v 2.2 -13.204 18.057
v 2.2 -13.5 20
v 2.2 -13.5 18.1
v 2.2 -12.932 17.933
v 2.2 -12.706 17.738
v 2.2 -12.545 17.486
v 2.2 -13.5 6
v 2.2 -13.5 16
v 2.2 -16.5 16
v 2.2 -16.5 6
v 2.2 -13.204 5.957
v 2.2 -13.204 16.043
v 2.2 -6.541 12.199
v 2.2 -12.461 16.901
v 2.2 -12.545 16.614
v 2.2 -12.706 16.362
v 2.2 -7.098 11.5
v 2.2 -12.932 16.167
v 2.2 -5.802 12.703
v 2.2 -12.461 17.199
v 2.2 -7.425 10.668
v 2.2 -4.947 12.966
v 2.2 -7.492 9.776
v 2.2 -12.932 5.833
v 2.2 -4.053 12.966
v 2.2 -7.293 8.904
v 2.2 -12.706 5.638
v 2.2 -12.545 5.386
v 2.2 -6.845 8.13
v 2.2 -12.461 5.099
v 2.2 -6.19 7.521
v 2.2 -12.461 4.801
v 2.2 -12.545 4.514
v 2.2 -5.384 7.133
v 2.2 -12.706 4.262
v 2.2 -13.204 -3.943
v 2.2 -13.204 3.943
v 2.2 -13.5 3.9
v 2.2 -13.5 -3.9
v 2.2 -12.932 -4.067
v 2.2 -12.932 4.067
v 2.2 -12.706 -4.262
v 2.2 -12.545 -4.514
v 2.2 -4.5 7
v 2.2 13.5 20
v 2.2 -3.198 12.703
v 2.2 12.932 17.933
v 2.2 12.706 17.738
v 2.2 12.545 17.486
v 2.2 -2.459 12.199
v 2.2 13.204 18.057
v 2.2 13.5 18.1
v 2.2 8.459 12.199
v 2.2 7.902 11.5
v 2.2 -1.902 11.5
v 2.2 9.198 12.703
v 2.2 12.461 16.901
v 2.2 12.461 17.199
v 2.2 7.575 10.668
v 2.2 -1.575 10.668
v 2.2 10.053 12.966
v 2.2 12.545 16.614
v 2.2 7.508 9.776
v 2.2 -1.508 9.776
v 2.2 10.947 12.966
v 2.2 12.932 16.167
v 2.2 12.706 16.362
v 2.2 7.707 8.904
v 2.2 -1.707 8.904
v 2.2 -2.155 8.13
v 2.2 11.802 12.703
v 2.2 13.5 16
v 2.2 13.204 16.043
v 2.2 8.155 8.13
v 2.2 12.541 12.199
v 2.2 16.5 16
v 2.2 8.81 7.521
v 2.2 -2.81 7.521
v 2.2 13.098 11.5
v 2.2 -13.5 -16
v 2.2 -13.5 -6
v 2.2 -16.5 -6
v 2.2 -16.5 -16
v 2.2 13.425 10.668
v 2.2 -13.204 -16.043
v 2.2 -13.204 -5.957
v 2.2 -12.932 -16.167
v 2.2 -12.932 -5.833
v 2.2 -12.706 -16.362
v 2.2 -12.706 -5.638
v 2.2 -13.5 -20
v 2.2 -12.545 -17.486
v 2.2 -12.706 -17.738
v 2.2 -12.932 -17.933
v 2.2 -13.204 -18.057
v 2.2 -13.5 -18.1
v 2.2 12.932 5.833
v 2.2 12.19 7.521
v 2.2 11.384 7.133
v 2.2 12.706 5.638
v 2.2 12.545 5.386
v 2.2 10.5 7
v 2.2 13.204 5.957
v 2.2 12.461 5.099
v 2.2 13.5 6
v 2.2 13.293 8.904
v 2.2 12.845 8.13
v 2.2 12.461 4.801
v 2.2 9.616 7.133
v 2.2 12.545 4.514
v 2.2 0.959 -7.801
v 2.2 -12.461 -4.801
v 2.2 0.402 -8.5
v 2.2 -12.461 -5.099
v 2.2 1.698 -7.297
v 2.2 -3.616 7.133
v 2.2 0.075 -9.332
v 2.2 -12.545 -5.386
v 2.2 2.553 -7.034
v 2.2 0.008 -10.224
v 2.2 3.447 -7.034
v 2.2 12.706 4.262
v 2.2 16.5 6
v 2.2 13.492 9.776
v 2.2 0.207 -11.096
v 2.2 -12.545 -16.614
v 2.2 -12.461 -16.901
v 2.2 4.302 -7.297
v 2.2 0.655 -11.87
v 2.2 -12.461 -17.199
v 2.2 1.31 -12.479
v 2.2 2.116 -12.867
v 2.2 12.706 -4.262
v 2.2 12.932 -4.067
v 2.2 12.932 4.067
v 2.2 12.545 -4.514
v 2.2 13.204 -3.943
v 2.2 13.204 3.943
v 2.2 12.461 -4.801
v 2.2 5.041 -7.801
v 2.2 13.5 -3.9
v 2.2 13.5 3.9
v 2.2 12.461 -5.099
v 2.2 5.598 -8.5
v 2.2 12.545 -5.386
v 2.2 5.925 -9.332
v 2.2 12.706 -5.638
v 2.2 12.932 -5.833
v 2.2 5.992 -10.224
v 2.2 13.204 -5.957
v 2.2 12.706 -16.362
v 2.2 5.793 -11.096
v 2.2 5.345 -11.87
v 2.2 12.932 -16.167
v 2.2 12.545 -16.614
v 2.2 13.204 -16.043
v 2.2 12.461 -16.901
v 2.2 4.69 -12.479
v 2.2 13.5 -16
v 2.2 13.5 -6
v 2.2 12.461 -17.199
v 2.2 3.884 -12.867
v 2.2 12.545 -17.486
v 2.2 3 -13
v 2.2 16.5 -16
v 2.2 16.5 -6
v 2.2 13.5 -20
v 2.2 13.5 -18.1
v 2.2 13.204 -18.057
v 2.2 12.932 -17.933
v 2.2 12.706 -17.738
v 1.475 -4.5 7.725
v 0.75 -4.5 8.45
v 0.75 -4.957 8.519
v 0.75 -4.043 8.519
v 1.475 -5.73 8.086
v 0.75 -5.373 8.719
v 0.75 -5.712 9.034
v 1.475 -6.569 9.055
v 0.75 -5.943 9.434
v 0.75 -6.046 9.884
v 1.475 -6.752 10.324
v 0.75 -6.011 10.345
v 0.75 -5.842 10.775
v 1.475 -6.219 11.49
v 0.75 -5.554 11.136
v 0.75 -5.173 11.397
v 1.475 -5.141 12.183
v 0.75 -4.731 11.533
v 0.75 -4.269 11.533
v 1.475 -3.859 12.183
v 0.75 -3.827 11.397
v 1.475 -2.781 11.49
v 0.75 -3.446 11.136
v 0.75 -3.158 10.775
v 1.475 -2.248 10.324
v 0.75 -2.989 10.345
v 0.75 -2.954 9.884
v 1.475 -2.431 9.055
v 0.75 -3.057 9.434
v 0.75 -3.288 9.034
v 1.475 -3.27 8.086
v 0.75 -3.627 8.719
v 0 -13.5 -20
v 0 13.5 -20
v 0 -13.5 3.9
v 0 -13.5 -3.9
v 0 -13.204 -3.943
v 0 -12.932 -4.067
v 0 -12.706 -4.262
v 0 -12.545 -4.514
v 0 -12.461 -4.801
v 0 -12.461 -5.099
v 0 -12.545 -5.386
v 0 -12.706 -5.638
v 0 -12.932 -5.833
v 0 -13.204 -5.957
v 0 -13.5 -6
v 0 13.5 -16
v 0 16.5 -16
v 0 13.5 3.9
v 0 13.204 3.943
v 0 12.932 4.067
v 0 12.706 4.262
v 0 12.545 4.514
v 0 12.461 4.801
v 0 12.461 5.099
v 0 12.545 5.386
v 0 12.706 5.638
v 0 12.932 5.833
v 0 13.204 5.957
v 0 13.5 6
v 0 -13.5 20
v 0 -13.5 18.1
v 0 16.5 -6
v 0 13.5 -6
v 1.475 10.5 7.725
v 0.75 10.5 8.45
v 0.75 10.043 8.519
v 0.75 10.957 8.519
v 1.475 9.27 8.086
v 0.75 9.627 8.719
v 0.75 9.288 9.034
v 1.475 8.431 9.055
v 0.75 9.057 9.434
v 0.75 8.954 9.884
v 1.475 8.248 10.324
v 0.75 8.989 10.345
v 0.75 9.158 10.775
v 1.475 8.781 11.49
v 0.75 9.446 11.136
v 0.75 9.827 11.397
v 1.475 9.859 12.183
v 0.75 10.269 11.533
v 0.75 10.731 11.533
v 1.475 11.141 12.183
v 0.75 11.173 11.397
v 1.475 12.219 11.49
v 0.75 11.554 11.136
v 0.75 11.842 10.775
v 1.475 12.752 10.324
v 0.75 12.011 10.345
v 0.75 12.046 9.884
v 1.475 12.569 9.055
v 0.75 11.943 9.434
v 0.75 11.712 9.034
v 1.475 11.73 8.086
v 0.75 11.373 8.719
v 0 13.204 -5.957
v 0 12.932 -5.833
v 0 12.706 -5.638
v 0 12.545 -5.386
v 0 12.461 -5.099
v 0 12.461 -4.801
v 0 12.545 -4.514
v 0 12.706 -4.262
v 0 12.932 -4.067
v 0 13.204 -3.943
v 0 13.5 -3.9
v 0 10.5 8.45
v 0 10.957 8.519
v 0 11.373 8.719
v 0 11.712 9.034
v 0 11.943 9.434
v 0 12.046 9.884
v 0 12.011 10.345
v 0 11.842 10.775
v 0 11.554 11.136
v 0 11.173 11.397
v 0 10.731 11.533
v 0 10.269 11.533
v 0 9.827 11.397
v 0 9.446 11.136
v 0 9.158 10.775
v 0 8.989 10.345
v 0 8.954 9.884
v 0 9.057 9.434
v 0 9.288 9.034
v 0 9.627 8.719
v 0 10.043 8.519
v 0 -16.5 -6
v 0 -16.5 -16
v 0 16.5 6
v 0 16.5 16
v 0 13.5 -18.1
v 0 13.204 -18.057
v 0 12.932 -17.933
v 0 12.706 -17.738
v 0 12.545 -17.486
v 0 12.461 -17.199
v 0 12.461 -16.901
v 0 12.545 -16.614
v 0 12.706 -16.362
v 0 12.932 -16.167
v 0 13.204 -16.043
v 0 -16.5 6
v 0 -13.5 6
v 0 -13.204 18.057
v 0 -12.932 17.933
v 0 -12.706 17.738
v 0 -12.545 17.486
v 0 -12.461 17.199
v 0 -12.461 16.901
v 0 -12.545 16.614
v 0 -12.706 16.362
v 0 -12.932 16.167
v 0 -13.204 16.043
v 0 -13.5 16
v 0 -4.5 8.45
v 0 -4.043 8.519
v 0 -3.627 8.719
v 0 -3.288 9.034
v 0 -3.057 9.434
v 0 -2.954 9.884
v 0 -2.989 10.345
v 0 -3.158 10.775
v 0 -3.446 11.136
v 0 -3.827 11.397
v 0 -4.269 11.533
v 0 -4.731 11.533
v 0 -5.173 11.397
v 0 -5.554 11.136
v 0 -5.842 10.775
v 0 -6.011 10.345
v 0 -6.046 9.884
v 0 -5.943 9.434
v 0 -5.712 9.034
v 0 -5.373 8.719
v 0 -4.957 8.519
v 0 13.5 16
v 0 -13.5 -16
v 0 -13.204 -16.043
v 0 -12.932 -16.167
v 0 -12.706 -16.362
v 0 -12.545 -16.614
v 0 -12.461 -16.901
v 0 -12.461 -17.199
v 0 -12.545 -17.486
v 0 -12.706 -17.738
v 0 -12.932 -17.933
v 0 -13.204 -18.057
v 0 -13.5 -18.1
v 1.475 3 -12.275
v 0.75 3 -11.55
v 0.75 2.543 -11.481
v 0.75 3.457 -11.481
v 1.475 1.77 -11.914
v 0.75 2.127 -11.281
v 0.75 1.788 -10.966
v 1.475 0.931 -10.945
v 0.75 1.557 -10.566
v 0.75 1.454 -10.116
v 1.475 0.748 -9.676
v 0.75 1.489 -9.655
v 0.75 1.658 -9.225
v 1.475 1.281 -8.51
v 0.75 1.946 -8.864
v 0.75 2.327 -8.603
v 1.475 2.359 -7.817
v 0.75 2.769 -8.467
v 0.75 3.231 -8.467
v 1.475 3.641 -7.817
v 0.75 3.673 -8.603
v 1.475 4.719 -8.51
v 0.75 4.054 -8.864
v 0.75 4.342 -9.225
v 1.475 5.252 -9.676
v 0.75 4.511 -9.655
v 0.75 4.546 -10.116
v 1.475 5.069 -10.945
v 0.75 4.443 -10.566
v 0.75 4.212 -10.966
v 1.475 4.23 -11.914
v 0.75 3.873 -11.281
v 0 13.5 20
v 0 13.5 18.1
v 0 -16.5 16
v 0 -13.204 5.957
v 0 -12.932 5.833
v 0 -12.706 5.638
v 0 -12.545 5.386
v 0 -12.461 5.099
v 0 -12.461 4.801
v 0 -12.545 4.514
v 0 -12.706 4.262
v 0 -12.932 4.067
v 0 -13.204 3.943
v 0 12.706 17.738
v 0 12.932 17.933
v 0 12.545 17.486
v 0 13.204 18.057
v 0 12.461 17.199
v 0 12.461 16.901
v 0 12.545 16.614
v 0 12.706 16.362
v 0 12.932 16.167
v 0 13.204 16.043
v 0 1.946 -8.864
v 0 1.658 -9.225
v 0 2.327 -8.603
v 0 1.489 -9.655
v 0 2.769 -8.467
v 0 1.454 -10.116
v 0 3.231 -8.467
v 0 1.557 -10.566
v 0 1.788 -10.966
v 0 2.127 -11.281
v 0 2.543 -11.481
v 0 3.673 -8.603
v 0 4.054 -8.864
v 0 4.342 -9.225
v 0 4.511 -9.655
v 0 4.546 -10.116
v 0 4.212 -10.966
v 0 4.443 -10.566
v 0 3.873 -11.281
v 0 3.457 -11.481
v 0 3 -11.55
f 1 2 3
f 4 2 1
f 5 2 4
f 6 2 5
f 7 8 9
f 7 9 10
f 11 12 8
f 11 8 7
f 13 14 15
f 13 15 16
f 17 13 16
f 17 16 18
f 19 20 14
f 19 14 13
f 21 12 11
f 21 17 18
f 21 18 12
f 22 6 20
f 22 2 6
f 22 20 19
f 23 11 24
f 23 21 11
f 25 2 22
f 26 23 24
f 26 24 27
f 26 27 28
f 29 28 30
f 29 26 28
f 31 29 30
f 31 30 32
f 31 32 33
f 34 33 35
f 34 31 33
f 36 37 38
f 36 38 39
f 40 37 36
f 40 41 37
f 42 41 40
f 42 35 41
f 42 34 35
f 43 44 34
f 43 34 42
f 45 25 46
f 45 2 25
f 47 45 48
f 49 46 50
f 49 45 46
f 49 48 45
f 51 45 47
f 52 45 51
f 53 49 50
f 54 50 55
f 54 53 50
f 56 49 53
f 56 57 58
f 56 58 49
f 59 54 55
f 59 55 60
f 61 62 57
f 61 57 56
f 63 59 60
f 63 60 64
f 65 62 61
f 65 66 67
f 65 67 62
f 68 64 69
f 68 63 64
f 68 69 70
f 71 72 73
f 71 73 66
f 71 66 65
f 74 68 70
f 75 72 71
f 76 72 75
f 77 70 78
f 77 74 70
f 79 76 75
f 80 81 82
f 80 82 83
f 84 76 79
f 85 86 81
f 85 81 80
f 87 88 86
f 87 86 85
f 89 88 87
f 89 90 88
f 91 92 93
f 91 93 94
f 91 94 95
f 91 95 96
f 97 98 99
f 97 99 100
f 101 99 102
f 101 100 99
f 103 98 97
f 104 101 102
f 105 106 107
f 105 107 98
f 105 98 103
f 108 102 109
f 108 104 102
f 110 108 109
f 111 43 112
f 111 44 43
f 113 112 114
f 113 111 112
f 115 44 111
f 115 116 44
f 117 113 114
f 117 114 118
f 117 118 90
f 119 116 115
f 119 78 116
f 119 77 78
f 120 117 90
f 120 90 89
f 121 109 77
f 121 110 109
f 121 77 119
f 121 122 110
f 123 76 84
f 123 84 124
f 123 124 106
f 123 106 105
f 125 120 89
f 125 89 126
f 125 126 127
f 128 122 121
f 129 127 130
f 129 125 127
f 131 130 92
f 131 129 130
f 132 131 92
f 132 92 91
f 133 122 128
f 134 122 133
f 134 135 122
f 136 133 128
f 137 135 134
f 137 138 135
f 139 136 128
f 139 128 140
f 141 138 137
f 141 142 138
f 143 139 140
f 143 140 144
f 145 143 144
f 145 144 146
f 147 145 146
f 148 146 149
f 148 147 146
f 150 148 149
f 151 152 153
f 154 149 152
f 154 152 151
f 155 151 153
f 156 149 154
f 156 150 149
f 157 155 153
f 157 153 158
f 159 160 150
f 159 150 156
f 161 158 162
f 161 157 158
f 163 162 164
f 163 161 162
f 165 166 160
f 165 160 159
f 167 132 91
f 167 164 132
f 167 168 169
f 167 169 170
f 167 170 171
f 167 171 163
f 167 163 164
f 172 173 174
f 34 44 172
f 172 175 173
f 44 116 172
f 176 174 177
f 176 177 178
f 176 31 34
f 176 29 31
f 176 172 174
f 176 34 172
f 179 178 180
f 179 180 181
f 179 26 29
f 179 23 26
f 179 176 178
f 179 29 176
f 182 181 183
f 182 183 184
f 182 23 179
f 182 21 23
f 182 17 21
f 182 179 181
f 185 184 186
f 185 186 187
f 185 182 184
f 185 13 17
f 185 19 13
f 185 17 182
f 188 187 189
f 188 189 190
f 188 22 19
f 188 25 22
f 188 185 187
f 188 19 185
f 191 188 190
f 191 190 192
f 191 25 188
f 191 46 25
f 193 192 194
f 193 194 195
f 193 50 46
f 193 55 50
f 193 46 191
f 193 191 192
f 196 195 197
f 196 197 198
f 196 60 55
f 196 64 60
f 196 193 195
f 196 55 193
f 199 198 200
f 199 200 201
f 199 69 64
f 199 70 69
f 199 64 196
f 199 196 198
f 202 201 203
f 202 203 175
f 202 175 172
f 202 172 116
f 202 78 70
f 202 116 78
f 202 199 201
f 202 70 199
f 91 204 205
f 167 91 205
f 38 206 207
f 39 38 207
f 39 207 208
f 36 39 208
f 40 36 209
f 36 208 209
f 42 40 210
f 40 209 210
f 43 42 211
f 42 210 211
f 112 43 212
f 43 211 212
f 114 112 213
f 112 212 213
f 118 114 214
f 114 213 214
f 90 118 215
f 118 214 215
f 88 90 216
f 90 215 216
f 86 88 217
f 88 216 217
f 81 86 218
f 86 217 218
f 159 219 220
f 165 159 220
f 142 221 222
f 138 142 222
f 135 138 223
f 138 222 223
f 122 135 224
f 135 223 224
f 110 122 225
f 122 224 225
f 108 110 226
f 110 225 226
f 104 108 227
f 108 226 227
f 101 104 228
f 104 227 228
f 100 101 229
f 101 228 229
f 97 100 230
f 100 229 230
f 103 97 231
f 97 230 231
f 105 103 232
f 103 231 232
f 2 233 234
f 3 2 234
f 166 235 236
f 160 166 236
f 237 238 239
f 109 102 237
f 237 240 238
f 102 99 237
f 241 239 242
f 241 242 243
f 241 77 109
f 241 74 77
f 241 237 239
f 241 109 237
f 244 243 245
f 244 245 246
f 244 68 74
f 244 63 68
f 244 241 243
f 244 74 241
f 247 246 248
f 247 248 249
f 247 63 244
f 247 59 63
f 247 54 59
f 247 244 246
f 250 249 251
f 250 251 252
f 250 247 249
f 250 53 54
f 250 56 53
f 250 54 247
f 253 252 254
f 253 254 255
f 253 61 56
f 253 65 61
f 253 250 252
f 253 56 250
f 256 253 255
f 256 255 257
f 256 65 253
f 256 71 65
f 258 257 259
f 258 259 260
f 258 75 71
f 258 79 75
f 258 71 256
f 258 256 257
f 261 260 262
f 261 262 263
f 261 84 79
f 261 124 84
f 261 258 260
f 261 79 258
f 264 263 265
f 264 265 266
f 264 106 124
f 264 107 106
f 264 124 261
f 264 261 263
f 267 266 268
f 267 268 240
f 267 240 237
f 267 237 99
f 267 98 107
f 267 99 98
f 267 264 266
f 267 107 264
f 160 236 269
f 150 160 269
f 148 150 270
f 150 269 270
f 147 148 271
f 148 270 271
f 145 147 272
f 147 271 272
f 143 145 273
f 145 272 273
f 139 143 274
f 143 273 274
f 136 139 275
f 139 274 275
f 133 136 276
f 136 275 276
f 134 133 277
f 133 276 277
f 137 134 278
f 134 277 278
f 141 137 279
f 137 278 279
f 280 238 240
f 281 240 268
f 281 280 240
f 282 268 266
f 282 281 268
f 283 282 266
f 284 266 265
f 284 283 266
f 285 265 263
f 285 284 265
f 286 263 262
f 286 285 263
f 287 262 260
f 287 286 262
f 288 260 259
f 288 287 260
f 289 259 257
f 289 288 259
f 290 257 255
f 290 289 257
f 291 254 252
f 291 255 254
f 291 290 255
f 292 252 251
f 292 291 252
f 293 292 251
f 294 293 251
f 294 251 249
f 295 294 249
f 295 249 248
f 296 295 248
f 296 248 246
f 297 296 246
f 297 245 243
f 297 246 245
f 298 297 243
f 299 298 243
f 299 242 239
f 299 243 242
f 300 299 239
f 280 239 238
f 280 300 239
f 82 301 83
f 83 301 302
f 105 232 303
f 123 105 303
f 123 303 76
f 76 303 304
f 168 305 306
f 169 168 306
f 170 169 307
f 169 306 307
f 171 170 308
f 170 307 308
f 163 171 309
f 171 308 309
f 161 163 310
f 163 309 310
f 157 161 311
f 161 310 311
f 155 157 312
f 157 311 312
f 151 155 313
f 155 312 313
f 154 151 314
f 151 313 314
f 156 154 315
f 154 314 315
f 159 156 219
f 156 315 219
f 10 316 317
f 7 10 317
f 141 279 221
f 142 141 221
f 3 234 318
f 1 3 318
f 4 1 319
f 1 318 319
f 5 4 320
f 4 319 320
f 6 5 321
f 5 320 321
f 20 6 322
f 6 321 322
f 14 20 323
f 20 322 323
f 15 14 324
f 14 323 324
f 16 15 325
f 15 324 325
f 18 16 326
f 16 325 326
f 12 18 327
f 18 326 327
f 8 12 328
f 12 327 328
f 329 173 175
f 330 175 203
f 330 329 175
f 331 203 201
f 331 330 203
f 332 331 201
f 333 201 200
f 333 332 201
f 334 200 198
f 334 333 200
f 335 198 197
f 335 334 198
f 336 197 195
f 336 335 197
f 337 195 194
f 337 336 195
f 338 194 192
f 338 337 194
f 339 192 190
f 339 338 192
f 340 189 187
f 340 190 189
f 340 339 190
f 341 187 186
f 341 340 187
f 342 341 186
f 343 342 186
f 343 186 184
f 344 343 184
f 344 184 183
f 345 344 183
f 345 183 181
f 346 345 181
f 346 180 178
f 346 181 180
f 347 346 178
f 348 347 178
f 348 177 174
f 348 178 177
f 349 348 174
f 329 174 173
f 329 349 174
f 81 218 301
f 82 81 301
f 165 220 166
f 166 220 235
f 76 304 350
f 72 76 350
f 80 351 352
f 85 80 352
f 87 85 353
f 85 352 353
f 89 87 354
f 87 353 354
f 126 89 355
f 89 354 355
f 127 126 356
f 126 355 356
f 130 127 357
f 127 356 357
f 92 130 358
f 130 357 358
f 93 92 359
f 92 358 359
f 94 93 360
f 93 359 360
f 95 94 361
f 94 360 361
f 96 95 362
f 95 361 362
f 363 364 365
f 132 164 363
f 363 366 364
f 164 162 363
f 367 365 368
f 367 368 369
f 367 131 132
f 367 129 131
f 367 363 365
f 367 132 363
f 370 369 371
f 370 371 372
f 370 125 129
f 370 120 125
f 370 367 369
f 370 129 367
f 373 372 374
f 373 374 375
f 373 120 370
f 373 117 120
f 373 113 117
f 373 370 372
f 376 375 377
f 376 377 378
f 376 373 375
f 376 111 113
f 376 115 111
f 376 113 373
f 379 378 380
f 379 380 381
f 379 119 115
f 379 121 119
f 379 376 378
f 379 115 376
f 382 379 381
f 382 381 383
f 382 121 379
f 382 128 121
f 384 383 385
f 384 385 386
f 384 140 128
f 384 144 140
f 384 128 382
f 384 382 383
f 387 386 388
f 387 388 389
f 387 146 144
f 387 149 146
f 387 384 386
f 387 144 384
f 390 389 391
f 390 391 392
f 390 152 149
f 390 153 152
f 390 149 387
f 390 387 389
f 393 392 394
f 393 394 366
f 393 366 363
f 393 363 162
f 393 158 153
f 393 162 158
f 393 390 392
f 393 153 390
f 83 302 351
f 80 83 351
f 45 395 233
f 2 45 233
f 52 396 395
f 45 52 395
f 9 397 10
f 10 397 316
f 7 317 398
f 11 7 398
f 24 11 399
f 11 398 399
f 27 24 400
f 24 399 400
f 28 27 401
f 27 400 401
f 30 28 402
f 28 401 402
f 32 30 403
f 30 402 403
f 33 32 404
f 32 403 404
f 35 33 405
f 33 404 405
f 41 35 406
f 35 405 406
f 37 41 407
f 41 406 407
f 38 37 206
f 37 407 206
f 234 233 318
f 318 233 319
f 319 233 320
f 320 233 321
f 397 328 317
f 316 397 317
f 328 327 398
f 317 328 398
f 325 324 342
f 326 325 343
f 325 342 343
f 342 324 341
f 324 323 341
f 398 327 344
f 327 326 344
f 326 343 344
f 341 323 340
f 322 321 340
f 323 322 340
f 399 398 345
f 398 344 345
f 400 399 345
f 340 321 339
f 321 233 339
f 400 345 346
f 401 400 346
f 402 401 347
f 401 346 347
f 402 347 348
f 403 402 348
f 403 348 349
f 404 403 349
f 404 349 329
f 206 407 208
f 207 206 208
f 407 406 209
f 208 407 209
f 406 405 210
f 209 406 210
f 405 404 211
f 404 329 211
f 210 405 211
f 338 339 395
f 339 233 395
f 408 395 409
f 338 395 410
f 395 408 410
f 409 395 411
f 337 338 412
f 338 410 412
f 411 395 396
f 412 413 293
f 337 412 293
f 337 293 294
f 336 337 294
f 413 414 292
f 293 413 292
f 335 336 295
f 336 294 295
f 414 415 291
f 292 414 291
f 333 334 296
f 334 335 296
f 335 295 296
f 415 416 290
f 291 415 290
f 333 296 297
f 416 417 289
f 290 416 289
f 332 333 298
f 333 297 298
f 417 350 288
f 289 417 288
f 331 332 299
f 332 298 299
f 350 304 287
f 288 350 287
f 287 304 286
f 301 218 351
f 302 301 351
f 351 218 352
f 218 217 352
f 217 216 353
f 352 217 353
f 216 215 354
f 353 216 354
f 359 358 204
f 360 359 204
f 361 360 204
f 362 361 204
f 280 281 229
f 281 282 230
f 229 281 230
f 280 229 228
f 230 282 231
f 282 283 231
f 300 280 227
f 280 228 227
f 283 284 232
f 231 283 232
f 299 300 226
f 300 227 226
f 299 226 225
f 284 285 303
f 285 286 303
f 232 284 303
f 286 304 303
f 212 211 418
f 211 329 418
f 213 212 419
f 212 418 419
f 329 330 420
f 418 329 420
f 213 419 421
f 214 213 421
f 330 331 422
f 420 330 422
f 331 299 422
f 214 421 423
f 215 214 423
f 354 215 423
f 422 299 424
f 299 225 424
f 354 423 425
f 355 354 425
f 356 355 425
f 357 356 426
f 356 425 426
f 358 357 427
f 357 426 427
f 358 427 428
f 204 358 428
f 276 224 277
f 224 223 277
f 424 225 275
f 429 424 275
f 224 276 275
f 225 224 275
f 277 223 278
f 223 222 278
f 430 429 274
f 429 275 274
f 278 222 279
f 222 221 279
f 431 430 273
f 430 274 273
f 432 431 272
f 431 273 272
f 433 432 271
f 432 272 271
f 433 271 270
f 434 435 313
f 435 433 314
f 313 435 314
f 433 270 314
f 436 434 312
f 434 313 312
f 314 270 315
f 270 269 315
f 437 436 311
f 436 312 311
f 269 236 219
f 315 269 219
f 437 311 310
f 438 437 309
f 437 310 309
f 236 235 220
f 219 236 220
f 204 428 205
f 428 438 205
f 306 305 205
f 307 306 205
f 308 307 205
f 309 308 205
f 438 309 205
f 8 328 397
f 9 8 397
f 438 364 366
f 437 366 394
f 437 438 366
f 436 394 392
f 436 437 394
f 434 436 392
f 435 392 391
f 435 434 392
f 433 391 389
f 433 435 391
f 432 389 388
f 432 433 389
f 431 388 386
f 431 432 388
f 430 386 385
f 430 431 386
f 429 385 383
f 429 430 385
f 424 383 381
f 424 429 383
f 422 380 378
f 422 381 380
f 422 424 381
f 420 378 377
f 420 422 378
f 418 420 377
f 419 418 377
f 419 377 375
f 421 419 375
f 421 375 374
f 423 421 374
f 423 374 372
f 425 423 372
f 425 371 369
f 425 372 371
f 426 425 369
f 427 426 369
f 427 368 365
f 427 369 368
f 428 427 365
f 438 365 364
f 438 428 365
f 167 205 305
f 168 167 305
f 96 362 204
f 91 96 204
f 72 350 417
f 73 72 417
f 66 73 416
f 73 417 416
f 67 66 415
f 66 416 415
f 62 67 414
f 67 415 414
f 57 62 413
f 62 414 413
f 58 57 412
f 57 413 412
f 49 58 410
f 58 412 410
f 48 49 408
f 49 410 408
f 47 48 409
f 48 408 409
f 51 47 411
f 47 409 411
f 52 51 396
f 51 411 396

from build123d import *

# Parameters (mm, degrees)
SKETCH_1_R               = 1.55
EXTRUDE_1_DEPTH          = 2.2
HOLE_WIZARD_1_AT_2_COUNT = 2
HOLE_WIZARD_1_AT_2_PITCH = 21.360009363
HOLE_WIZARD_1_AT_3_COUNT = 2
HOLE_WIZARD_1_AT_3_PITCH = 15


with BuildPart() as part:
    # 草图1 → 凸台-拉伸1 (new body)
    with BuildSketch(Plane(origin=(0, 0, 0), x_dir=(0, 0, -1), z_dir=(1, 0, 0))):
        with BuildLine():
            Line((-16, 16.5), (-16, 13.5))
            ThreePointArc((-16, 13.5), (-17.05, 12.45), (-18.1, 13.5))
            Line((-18.1, 13.5), (-20, 13.5))
            Line((-20, 13.5), (-20, -13.5))
            Line((-20, -13.5), (-18.1, -13.5))
            ThreePointArc((-18.1, -13.5), (-17.05, -12.45), (-16, -13.5))
            Line((-16, -13.5), (-16, -16.5))
            Line((-16, -16.5), (-6, -16.5))
            Line((-6, -16.5), (-6, -13.5))
            ThreePointArc((-6, -13.5), (-4.95, -12.45), (-3.9, -13.5))
            Line((-3.9, -13.5), (3.9, -13.5))
            ThreePointArc((3.9, -13.5), (4.95, -12.45), (6, -13.5))
            Line((6, -13.5), (6, -16.5))
            Line((6, -16.5), (16, -16.5))
            Line((16, -16.5), (16, -13.5))
            ThreePointArc((16, -13.5), (17.05, -12.45), (18.1, -13.5))
            Line((18.1, -13.5), (20, -13.5))
            Line((20, -13.5), (20, 13.5))
            Line((20, 13.5), (18.1, 13.5))
            ThreePointArc((18.1, 13.5), (17.05, 12.45), (16, 13.5))
            Line((16, 13.5), (16, 16.5))
            Line((16, 16.5), (6, 16.5))
            Line((6, 16.5), (6, 13.5))
            ThreePointArc((6, 13.5), (4.95, 12.45), (3.9, 13.5))
            Line((3.9, 13.5), (-3.9, 13.5))
            ThreePointArc((-3.9, 13.5), (-4.95, 12.45), (-6, 13.5))
            Line((-6, 13.5), (-6, 16.5))
            Line((-6, 16.5), (-16, 16.5))
        make_face()
        with Locations((-10, -4.5)):
            Circle(SKETCH_1_R, mode=Mode.SUBTRACT)
        with Locations((-10, 10.5)):
            Circle(SKETCH_1_R, mode=Mode.SUBTRACT)
        with Locations((10, 3)):
            Circle(SKETCH_1_R, mode=Mode.SUBTRACT)
    extrude(amount=EXTRUDE_1_DEPTH)

    # 草图2 → 打孔尺寸(%根据十字)槽沉头木螺钉的类型1 (revolve, cut)
    with BuildSketch(Plane(origin=(2.2, 10.5, 10), x_dir=(0, 0, -1), z_dir=(0, 1, 0))):
        Polygon((0, 0), (0, 2.2), (1.55, 2.2), (1.55, 1.45), (3, 0), align=None)
    hole_wizard_1 = revolve(axis=Axis((8.55, 10.5, 10), (-1, 0, 0)), mode=Mode.SUBTRACT)

    # 打孔尺寸(%根据十字)槽沉头木螺钉的类型1 at 2: 打孔尺寸(%根据十字)槽沉头木螺钉的类型1 ×2
    with Locations(*[Vector(0, -0.3511234415883914, -0.9363291775690447) * (i * HOLE_WIZARD_1_AT_2_PITCH) for i in range(1, HOLE_WIZARD_1_AT_2_COUNT)]):
        add(hole_wizard_1, mode=Mode.SUBTRACT)

    # 打孔尺寸(%根据十字)槽沉头木螺钉的类型1 at 3: 打孔尺寸(%根据十字)槽沉头木螺钉的类型1 ×2
    with Locations(*[(0, -i * HOLE_WIZARD_1_AT_3_PITCH, 0) for i in range(1, HOLE_WIZARD_1_AT_3_COUNT)]):
        add(hole_wizard_1, mode=Mode.SUBTRACT)


solid = part.part
